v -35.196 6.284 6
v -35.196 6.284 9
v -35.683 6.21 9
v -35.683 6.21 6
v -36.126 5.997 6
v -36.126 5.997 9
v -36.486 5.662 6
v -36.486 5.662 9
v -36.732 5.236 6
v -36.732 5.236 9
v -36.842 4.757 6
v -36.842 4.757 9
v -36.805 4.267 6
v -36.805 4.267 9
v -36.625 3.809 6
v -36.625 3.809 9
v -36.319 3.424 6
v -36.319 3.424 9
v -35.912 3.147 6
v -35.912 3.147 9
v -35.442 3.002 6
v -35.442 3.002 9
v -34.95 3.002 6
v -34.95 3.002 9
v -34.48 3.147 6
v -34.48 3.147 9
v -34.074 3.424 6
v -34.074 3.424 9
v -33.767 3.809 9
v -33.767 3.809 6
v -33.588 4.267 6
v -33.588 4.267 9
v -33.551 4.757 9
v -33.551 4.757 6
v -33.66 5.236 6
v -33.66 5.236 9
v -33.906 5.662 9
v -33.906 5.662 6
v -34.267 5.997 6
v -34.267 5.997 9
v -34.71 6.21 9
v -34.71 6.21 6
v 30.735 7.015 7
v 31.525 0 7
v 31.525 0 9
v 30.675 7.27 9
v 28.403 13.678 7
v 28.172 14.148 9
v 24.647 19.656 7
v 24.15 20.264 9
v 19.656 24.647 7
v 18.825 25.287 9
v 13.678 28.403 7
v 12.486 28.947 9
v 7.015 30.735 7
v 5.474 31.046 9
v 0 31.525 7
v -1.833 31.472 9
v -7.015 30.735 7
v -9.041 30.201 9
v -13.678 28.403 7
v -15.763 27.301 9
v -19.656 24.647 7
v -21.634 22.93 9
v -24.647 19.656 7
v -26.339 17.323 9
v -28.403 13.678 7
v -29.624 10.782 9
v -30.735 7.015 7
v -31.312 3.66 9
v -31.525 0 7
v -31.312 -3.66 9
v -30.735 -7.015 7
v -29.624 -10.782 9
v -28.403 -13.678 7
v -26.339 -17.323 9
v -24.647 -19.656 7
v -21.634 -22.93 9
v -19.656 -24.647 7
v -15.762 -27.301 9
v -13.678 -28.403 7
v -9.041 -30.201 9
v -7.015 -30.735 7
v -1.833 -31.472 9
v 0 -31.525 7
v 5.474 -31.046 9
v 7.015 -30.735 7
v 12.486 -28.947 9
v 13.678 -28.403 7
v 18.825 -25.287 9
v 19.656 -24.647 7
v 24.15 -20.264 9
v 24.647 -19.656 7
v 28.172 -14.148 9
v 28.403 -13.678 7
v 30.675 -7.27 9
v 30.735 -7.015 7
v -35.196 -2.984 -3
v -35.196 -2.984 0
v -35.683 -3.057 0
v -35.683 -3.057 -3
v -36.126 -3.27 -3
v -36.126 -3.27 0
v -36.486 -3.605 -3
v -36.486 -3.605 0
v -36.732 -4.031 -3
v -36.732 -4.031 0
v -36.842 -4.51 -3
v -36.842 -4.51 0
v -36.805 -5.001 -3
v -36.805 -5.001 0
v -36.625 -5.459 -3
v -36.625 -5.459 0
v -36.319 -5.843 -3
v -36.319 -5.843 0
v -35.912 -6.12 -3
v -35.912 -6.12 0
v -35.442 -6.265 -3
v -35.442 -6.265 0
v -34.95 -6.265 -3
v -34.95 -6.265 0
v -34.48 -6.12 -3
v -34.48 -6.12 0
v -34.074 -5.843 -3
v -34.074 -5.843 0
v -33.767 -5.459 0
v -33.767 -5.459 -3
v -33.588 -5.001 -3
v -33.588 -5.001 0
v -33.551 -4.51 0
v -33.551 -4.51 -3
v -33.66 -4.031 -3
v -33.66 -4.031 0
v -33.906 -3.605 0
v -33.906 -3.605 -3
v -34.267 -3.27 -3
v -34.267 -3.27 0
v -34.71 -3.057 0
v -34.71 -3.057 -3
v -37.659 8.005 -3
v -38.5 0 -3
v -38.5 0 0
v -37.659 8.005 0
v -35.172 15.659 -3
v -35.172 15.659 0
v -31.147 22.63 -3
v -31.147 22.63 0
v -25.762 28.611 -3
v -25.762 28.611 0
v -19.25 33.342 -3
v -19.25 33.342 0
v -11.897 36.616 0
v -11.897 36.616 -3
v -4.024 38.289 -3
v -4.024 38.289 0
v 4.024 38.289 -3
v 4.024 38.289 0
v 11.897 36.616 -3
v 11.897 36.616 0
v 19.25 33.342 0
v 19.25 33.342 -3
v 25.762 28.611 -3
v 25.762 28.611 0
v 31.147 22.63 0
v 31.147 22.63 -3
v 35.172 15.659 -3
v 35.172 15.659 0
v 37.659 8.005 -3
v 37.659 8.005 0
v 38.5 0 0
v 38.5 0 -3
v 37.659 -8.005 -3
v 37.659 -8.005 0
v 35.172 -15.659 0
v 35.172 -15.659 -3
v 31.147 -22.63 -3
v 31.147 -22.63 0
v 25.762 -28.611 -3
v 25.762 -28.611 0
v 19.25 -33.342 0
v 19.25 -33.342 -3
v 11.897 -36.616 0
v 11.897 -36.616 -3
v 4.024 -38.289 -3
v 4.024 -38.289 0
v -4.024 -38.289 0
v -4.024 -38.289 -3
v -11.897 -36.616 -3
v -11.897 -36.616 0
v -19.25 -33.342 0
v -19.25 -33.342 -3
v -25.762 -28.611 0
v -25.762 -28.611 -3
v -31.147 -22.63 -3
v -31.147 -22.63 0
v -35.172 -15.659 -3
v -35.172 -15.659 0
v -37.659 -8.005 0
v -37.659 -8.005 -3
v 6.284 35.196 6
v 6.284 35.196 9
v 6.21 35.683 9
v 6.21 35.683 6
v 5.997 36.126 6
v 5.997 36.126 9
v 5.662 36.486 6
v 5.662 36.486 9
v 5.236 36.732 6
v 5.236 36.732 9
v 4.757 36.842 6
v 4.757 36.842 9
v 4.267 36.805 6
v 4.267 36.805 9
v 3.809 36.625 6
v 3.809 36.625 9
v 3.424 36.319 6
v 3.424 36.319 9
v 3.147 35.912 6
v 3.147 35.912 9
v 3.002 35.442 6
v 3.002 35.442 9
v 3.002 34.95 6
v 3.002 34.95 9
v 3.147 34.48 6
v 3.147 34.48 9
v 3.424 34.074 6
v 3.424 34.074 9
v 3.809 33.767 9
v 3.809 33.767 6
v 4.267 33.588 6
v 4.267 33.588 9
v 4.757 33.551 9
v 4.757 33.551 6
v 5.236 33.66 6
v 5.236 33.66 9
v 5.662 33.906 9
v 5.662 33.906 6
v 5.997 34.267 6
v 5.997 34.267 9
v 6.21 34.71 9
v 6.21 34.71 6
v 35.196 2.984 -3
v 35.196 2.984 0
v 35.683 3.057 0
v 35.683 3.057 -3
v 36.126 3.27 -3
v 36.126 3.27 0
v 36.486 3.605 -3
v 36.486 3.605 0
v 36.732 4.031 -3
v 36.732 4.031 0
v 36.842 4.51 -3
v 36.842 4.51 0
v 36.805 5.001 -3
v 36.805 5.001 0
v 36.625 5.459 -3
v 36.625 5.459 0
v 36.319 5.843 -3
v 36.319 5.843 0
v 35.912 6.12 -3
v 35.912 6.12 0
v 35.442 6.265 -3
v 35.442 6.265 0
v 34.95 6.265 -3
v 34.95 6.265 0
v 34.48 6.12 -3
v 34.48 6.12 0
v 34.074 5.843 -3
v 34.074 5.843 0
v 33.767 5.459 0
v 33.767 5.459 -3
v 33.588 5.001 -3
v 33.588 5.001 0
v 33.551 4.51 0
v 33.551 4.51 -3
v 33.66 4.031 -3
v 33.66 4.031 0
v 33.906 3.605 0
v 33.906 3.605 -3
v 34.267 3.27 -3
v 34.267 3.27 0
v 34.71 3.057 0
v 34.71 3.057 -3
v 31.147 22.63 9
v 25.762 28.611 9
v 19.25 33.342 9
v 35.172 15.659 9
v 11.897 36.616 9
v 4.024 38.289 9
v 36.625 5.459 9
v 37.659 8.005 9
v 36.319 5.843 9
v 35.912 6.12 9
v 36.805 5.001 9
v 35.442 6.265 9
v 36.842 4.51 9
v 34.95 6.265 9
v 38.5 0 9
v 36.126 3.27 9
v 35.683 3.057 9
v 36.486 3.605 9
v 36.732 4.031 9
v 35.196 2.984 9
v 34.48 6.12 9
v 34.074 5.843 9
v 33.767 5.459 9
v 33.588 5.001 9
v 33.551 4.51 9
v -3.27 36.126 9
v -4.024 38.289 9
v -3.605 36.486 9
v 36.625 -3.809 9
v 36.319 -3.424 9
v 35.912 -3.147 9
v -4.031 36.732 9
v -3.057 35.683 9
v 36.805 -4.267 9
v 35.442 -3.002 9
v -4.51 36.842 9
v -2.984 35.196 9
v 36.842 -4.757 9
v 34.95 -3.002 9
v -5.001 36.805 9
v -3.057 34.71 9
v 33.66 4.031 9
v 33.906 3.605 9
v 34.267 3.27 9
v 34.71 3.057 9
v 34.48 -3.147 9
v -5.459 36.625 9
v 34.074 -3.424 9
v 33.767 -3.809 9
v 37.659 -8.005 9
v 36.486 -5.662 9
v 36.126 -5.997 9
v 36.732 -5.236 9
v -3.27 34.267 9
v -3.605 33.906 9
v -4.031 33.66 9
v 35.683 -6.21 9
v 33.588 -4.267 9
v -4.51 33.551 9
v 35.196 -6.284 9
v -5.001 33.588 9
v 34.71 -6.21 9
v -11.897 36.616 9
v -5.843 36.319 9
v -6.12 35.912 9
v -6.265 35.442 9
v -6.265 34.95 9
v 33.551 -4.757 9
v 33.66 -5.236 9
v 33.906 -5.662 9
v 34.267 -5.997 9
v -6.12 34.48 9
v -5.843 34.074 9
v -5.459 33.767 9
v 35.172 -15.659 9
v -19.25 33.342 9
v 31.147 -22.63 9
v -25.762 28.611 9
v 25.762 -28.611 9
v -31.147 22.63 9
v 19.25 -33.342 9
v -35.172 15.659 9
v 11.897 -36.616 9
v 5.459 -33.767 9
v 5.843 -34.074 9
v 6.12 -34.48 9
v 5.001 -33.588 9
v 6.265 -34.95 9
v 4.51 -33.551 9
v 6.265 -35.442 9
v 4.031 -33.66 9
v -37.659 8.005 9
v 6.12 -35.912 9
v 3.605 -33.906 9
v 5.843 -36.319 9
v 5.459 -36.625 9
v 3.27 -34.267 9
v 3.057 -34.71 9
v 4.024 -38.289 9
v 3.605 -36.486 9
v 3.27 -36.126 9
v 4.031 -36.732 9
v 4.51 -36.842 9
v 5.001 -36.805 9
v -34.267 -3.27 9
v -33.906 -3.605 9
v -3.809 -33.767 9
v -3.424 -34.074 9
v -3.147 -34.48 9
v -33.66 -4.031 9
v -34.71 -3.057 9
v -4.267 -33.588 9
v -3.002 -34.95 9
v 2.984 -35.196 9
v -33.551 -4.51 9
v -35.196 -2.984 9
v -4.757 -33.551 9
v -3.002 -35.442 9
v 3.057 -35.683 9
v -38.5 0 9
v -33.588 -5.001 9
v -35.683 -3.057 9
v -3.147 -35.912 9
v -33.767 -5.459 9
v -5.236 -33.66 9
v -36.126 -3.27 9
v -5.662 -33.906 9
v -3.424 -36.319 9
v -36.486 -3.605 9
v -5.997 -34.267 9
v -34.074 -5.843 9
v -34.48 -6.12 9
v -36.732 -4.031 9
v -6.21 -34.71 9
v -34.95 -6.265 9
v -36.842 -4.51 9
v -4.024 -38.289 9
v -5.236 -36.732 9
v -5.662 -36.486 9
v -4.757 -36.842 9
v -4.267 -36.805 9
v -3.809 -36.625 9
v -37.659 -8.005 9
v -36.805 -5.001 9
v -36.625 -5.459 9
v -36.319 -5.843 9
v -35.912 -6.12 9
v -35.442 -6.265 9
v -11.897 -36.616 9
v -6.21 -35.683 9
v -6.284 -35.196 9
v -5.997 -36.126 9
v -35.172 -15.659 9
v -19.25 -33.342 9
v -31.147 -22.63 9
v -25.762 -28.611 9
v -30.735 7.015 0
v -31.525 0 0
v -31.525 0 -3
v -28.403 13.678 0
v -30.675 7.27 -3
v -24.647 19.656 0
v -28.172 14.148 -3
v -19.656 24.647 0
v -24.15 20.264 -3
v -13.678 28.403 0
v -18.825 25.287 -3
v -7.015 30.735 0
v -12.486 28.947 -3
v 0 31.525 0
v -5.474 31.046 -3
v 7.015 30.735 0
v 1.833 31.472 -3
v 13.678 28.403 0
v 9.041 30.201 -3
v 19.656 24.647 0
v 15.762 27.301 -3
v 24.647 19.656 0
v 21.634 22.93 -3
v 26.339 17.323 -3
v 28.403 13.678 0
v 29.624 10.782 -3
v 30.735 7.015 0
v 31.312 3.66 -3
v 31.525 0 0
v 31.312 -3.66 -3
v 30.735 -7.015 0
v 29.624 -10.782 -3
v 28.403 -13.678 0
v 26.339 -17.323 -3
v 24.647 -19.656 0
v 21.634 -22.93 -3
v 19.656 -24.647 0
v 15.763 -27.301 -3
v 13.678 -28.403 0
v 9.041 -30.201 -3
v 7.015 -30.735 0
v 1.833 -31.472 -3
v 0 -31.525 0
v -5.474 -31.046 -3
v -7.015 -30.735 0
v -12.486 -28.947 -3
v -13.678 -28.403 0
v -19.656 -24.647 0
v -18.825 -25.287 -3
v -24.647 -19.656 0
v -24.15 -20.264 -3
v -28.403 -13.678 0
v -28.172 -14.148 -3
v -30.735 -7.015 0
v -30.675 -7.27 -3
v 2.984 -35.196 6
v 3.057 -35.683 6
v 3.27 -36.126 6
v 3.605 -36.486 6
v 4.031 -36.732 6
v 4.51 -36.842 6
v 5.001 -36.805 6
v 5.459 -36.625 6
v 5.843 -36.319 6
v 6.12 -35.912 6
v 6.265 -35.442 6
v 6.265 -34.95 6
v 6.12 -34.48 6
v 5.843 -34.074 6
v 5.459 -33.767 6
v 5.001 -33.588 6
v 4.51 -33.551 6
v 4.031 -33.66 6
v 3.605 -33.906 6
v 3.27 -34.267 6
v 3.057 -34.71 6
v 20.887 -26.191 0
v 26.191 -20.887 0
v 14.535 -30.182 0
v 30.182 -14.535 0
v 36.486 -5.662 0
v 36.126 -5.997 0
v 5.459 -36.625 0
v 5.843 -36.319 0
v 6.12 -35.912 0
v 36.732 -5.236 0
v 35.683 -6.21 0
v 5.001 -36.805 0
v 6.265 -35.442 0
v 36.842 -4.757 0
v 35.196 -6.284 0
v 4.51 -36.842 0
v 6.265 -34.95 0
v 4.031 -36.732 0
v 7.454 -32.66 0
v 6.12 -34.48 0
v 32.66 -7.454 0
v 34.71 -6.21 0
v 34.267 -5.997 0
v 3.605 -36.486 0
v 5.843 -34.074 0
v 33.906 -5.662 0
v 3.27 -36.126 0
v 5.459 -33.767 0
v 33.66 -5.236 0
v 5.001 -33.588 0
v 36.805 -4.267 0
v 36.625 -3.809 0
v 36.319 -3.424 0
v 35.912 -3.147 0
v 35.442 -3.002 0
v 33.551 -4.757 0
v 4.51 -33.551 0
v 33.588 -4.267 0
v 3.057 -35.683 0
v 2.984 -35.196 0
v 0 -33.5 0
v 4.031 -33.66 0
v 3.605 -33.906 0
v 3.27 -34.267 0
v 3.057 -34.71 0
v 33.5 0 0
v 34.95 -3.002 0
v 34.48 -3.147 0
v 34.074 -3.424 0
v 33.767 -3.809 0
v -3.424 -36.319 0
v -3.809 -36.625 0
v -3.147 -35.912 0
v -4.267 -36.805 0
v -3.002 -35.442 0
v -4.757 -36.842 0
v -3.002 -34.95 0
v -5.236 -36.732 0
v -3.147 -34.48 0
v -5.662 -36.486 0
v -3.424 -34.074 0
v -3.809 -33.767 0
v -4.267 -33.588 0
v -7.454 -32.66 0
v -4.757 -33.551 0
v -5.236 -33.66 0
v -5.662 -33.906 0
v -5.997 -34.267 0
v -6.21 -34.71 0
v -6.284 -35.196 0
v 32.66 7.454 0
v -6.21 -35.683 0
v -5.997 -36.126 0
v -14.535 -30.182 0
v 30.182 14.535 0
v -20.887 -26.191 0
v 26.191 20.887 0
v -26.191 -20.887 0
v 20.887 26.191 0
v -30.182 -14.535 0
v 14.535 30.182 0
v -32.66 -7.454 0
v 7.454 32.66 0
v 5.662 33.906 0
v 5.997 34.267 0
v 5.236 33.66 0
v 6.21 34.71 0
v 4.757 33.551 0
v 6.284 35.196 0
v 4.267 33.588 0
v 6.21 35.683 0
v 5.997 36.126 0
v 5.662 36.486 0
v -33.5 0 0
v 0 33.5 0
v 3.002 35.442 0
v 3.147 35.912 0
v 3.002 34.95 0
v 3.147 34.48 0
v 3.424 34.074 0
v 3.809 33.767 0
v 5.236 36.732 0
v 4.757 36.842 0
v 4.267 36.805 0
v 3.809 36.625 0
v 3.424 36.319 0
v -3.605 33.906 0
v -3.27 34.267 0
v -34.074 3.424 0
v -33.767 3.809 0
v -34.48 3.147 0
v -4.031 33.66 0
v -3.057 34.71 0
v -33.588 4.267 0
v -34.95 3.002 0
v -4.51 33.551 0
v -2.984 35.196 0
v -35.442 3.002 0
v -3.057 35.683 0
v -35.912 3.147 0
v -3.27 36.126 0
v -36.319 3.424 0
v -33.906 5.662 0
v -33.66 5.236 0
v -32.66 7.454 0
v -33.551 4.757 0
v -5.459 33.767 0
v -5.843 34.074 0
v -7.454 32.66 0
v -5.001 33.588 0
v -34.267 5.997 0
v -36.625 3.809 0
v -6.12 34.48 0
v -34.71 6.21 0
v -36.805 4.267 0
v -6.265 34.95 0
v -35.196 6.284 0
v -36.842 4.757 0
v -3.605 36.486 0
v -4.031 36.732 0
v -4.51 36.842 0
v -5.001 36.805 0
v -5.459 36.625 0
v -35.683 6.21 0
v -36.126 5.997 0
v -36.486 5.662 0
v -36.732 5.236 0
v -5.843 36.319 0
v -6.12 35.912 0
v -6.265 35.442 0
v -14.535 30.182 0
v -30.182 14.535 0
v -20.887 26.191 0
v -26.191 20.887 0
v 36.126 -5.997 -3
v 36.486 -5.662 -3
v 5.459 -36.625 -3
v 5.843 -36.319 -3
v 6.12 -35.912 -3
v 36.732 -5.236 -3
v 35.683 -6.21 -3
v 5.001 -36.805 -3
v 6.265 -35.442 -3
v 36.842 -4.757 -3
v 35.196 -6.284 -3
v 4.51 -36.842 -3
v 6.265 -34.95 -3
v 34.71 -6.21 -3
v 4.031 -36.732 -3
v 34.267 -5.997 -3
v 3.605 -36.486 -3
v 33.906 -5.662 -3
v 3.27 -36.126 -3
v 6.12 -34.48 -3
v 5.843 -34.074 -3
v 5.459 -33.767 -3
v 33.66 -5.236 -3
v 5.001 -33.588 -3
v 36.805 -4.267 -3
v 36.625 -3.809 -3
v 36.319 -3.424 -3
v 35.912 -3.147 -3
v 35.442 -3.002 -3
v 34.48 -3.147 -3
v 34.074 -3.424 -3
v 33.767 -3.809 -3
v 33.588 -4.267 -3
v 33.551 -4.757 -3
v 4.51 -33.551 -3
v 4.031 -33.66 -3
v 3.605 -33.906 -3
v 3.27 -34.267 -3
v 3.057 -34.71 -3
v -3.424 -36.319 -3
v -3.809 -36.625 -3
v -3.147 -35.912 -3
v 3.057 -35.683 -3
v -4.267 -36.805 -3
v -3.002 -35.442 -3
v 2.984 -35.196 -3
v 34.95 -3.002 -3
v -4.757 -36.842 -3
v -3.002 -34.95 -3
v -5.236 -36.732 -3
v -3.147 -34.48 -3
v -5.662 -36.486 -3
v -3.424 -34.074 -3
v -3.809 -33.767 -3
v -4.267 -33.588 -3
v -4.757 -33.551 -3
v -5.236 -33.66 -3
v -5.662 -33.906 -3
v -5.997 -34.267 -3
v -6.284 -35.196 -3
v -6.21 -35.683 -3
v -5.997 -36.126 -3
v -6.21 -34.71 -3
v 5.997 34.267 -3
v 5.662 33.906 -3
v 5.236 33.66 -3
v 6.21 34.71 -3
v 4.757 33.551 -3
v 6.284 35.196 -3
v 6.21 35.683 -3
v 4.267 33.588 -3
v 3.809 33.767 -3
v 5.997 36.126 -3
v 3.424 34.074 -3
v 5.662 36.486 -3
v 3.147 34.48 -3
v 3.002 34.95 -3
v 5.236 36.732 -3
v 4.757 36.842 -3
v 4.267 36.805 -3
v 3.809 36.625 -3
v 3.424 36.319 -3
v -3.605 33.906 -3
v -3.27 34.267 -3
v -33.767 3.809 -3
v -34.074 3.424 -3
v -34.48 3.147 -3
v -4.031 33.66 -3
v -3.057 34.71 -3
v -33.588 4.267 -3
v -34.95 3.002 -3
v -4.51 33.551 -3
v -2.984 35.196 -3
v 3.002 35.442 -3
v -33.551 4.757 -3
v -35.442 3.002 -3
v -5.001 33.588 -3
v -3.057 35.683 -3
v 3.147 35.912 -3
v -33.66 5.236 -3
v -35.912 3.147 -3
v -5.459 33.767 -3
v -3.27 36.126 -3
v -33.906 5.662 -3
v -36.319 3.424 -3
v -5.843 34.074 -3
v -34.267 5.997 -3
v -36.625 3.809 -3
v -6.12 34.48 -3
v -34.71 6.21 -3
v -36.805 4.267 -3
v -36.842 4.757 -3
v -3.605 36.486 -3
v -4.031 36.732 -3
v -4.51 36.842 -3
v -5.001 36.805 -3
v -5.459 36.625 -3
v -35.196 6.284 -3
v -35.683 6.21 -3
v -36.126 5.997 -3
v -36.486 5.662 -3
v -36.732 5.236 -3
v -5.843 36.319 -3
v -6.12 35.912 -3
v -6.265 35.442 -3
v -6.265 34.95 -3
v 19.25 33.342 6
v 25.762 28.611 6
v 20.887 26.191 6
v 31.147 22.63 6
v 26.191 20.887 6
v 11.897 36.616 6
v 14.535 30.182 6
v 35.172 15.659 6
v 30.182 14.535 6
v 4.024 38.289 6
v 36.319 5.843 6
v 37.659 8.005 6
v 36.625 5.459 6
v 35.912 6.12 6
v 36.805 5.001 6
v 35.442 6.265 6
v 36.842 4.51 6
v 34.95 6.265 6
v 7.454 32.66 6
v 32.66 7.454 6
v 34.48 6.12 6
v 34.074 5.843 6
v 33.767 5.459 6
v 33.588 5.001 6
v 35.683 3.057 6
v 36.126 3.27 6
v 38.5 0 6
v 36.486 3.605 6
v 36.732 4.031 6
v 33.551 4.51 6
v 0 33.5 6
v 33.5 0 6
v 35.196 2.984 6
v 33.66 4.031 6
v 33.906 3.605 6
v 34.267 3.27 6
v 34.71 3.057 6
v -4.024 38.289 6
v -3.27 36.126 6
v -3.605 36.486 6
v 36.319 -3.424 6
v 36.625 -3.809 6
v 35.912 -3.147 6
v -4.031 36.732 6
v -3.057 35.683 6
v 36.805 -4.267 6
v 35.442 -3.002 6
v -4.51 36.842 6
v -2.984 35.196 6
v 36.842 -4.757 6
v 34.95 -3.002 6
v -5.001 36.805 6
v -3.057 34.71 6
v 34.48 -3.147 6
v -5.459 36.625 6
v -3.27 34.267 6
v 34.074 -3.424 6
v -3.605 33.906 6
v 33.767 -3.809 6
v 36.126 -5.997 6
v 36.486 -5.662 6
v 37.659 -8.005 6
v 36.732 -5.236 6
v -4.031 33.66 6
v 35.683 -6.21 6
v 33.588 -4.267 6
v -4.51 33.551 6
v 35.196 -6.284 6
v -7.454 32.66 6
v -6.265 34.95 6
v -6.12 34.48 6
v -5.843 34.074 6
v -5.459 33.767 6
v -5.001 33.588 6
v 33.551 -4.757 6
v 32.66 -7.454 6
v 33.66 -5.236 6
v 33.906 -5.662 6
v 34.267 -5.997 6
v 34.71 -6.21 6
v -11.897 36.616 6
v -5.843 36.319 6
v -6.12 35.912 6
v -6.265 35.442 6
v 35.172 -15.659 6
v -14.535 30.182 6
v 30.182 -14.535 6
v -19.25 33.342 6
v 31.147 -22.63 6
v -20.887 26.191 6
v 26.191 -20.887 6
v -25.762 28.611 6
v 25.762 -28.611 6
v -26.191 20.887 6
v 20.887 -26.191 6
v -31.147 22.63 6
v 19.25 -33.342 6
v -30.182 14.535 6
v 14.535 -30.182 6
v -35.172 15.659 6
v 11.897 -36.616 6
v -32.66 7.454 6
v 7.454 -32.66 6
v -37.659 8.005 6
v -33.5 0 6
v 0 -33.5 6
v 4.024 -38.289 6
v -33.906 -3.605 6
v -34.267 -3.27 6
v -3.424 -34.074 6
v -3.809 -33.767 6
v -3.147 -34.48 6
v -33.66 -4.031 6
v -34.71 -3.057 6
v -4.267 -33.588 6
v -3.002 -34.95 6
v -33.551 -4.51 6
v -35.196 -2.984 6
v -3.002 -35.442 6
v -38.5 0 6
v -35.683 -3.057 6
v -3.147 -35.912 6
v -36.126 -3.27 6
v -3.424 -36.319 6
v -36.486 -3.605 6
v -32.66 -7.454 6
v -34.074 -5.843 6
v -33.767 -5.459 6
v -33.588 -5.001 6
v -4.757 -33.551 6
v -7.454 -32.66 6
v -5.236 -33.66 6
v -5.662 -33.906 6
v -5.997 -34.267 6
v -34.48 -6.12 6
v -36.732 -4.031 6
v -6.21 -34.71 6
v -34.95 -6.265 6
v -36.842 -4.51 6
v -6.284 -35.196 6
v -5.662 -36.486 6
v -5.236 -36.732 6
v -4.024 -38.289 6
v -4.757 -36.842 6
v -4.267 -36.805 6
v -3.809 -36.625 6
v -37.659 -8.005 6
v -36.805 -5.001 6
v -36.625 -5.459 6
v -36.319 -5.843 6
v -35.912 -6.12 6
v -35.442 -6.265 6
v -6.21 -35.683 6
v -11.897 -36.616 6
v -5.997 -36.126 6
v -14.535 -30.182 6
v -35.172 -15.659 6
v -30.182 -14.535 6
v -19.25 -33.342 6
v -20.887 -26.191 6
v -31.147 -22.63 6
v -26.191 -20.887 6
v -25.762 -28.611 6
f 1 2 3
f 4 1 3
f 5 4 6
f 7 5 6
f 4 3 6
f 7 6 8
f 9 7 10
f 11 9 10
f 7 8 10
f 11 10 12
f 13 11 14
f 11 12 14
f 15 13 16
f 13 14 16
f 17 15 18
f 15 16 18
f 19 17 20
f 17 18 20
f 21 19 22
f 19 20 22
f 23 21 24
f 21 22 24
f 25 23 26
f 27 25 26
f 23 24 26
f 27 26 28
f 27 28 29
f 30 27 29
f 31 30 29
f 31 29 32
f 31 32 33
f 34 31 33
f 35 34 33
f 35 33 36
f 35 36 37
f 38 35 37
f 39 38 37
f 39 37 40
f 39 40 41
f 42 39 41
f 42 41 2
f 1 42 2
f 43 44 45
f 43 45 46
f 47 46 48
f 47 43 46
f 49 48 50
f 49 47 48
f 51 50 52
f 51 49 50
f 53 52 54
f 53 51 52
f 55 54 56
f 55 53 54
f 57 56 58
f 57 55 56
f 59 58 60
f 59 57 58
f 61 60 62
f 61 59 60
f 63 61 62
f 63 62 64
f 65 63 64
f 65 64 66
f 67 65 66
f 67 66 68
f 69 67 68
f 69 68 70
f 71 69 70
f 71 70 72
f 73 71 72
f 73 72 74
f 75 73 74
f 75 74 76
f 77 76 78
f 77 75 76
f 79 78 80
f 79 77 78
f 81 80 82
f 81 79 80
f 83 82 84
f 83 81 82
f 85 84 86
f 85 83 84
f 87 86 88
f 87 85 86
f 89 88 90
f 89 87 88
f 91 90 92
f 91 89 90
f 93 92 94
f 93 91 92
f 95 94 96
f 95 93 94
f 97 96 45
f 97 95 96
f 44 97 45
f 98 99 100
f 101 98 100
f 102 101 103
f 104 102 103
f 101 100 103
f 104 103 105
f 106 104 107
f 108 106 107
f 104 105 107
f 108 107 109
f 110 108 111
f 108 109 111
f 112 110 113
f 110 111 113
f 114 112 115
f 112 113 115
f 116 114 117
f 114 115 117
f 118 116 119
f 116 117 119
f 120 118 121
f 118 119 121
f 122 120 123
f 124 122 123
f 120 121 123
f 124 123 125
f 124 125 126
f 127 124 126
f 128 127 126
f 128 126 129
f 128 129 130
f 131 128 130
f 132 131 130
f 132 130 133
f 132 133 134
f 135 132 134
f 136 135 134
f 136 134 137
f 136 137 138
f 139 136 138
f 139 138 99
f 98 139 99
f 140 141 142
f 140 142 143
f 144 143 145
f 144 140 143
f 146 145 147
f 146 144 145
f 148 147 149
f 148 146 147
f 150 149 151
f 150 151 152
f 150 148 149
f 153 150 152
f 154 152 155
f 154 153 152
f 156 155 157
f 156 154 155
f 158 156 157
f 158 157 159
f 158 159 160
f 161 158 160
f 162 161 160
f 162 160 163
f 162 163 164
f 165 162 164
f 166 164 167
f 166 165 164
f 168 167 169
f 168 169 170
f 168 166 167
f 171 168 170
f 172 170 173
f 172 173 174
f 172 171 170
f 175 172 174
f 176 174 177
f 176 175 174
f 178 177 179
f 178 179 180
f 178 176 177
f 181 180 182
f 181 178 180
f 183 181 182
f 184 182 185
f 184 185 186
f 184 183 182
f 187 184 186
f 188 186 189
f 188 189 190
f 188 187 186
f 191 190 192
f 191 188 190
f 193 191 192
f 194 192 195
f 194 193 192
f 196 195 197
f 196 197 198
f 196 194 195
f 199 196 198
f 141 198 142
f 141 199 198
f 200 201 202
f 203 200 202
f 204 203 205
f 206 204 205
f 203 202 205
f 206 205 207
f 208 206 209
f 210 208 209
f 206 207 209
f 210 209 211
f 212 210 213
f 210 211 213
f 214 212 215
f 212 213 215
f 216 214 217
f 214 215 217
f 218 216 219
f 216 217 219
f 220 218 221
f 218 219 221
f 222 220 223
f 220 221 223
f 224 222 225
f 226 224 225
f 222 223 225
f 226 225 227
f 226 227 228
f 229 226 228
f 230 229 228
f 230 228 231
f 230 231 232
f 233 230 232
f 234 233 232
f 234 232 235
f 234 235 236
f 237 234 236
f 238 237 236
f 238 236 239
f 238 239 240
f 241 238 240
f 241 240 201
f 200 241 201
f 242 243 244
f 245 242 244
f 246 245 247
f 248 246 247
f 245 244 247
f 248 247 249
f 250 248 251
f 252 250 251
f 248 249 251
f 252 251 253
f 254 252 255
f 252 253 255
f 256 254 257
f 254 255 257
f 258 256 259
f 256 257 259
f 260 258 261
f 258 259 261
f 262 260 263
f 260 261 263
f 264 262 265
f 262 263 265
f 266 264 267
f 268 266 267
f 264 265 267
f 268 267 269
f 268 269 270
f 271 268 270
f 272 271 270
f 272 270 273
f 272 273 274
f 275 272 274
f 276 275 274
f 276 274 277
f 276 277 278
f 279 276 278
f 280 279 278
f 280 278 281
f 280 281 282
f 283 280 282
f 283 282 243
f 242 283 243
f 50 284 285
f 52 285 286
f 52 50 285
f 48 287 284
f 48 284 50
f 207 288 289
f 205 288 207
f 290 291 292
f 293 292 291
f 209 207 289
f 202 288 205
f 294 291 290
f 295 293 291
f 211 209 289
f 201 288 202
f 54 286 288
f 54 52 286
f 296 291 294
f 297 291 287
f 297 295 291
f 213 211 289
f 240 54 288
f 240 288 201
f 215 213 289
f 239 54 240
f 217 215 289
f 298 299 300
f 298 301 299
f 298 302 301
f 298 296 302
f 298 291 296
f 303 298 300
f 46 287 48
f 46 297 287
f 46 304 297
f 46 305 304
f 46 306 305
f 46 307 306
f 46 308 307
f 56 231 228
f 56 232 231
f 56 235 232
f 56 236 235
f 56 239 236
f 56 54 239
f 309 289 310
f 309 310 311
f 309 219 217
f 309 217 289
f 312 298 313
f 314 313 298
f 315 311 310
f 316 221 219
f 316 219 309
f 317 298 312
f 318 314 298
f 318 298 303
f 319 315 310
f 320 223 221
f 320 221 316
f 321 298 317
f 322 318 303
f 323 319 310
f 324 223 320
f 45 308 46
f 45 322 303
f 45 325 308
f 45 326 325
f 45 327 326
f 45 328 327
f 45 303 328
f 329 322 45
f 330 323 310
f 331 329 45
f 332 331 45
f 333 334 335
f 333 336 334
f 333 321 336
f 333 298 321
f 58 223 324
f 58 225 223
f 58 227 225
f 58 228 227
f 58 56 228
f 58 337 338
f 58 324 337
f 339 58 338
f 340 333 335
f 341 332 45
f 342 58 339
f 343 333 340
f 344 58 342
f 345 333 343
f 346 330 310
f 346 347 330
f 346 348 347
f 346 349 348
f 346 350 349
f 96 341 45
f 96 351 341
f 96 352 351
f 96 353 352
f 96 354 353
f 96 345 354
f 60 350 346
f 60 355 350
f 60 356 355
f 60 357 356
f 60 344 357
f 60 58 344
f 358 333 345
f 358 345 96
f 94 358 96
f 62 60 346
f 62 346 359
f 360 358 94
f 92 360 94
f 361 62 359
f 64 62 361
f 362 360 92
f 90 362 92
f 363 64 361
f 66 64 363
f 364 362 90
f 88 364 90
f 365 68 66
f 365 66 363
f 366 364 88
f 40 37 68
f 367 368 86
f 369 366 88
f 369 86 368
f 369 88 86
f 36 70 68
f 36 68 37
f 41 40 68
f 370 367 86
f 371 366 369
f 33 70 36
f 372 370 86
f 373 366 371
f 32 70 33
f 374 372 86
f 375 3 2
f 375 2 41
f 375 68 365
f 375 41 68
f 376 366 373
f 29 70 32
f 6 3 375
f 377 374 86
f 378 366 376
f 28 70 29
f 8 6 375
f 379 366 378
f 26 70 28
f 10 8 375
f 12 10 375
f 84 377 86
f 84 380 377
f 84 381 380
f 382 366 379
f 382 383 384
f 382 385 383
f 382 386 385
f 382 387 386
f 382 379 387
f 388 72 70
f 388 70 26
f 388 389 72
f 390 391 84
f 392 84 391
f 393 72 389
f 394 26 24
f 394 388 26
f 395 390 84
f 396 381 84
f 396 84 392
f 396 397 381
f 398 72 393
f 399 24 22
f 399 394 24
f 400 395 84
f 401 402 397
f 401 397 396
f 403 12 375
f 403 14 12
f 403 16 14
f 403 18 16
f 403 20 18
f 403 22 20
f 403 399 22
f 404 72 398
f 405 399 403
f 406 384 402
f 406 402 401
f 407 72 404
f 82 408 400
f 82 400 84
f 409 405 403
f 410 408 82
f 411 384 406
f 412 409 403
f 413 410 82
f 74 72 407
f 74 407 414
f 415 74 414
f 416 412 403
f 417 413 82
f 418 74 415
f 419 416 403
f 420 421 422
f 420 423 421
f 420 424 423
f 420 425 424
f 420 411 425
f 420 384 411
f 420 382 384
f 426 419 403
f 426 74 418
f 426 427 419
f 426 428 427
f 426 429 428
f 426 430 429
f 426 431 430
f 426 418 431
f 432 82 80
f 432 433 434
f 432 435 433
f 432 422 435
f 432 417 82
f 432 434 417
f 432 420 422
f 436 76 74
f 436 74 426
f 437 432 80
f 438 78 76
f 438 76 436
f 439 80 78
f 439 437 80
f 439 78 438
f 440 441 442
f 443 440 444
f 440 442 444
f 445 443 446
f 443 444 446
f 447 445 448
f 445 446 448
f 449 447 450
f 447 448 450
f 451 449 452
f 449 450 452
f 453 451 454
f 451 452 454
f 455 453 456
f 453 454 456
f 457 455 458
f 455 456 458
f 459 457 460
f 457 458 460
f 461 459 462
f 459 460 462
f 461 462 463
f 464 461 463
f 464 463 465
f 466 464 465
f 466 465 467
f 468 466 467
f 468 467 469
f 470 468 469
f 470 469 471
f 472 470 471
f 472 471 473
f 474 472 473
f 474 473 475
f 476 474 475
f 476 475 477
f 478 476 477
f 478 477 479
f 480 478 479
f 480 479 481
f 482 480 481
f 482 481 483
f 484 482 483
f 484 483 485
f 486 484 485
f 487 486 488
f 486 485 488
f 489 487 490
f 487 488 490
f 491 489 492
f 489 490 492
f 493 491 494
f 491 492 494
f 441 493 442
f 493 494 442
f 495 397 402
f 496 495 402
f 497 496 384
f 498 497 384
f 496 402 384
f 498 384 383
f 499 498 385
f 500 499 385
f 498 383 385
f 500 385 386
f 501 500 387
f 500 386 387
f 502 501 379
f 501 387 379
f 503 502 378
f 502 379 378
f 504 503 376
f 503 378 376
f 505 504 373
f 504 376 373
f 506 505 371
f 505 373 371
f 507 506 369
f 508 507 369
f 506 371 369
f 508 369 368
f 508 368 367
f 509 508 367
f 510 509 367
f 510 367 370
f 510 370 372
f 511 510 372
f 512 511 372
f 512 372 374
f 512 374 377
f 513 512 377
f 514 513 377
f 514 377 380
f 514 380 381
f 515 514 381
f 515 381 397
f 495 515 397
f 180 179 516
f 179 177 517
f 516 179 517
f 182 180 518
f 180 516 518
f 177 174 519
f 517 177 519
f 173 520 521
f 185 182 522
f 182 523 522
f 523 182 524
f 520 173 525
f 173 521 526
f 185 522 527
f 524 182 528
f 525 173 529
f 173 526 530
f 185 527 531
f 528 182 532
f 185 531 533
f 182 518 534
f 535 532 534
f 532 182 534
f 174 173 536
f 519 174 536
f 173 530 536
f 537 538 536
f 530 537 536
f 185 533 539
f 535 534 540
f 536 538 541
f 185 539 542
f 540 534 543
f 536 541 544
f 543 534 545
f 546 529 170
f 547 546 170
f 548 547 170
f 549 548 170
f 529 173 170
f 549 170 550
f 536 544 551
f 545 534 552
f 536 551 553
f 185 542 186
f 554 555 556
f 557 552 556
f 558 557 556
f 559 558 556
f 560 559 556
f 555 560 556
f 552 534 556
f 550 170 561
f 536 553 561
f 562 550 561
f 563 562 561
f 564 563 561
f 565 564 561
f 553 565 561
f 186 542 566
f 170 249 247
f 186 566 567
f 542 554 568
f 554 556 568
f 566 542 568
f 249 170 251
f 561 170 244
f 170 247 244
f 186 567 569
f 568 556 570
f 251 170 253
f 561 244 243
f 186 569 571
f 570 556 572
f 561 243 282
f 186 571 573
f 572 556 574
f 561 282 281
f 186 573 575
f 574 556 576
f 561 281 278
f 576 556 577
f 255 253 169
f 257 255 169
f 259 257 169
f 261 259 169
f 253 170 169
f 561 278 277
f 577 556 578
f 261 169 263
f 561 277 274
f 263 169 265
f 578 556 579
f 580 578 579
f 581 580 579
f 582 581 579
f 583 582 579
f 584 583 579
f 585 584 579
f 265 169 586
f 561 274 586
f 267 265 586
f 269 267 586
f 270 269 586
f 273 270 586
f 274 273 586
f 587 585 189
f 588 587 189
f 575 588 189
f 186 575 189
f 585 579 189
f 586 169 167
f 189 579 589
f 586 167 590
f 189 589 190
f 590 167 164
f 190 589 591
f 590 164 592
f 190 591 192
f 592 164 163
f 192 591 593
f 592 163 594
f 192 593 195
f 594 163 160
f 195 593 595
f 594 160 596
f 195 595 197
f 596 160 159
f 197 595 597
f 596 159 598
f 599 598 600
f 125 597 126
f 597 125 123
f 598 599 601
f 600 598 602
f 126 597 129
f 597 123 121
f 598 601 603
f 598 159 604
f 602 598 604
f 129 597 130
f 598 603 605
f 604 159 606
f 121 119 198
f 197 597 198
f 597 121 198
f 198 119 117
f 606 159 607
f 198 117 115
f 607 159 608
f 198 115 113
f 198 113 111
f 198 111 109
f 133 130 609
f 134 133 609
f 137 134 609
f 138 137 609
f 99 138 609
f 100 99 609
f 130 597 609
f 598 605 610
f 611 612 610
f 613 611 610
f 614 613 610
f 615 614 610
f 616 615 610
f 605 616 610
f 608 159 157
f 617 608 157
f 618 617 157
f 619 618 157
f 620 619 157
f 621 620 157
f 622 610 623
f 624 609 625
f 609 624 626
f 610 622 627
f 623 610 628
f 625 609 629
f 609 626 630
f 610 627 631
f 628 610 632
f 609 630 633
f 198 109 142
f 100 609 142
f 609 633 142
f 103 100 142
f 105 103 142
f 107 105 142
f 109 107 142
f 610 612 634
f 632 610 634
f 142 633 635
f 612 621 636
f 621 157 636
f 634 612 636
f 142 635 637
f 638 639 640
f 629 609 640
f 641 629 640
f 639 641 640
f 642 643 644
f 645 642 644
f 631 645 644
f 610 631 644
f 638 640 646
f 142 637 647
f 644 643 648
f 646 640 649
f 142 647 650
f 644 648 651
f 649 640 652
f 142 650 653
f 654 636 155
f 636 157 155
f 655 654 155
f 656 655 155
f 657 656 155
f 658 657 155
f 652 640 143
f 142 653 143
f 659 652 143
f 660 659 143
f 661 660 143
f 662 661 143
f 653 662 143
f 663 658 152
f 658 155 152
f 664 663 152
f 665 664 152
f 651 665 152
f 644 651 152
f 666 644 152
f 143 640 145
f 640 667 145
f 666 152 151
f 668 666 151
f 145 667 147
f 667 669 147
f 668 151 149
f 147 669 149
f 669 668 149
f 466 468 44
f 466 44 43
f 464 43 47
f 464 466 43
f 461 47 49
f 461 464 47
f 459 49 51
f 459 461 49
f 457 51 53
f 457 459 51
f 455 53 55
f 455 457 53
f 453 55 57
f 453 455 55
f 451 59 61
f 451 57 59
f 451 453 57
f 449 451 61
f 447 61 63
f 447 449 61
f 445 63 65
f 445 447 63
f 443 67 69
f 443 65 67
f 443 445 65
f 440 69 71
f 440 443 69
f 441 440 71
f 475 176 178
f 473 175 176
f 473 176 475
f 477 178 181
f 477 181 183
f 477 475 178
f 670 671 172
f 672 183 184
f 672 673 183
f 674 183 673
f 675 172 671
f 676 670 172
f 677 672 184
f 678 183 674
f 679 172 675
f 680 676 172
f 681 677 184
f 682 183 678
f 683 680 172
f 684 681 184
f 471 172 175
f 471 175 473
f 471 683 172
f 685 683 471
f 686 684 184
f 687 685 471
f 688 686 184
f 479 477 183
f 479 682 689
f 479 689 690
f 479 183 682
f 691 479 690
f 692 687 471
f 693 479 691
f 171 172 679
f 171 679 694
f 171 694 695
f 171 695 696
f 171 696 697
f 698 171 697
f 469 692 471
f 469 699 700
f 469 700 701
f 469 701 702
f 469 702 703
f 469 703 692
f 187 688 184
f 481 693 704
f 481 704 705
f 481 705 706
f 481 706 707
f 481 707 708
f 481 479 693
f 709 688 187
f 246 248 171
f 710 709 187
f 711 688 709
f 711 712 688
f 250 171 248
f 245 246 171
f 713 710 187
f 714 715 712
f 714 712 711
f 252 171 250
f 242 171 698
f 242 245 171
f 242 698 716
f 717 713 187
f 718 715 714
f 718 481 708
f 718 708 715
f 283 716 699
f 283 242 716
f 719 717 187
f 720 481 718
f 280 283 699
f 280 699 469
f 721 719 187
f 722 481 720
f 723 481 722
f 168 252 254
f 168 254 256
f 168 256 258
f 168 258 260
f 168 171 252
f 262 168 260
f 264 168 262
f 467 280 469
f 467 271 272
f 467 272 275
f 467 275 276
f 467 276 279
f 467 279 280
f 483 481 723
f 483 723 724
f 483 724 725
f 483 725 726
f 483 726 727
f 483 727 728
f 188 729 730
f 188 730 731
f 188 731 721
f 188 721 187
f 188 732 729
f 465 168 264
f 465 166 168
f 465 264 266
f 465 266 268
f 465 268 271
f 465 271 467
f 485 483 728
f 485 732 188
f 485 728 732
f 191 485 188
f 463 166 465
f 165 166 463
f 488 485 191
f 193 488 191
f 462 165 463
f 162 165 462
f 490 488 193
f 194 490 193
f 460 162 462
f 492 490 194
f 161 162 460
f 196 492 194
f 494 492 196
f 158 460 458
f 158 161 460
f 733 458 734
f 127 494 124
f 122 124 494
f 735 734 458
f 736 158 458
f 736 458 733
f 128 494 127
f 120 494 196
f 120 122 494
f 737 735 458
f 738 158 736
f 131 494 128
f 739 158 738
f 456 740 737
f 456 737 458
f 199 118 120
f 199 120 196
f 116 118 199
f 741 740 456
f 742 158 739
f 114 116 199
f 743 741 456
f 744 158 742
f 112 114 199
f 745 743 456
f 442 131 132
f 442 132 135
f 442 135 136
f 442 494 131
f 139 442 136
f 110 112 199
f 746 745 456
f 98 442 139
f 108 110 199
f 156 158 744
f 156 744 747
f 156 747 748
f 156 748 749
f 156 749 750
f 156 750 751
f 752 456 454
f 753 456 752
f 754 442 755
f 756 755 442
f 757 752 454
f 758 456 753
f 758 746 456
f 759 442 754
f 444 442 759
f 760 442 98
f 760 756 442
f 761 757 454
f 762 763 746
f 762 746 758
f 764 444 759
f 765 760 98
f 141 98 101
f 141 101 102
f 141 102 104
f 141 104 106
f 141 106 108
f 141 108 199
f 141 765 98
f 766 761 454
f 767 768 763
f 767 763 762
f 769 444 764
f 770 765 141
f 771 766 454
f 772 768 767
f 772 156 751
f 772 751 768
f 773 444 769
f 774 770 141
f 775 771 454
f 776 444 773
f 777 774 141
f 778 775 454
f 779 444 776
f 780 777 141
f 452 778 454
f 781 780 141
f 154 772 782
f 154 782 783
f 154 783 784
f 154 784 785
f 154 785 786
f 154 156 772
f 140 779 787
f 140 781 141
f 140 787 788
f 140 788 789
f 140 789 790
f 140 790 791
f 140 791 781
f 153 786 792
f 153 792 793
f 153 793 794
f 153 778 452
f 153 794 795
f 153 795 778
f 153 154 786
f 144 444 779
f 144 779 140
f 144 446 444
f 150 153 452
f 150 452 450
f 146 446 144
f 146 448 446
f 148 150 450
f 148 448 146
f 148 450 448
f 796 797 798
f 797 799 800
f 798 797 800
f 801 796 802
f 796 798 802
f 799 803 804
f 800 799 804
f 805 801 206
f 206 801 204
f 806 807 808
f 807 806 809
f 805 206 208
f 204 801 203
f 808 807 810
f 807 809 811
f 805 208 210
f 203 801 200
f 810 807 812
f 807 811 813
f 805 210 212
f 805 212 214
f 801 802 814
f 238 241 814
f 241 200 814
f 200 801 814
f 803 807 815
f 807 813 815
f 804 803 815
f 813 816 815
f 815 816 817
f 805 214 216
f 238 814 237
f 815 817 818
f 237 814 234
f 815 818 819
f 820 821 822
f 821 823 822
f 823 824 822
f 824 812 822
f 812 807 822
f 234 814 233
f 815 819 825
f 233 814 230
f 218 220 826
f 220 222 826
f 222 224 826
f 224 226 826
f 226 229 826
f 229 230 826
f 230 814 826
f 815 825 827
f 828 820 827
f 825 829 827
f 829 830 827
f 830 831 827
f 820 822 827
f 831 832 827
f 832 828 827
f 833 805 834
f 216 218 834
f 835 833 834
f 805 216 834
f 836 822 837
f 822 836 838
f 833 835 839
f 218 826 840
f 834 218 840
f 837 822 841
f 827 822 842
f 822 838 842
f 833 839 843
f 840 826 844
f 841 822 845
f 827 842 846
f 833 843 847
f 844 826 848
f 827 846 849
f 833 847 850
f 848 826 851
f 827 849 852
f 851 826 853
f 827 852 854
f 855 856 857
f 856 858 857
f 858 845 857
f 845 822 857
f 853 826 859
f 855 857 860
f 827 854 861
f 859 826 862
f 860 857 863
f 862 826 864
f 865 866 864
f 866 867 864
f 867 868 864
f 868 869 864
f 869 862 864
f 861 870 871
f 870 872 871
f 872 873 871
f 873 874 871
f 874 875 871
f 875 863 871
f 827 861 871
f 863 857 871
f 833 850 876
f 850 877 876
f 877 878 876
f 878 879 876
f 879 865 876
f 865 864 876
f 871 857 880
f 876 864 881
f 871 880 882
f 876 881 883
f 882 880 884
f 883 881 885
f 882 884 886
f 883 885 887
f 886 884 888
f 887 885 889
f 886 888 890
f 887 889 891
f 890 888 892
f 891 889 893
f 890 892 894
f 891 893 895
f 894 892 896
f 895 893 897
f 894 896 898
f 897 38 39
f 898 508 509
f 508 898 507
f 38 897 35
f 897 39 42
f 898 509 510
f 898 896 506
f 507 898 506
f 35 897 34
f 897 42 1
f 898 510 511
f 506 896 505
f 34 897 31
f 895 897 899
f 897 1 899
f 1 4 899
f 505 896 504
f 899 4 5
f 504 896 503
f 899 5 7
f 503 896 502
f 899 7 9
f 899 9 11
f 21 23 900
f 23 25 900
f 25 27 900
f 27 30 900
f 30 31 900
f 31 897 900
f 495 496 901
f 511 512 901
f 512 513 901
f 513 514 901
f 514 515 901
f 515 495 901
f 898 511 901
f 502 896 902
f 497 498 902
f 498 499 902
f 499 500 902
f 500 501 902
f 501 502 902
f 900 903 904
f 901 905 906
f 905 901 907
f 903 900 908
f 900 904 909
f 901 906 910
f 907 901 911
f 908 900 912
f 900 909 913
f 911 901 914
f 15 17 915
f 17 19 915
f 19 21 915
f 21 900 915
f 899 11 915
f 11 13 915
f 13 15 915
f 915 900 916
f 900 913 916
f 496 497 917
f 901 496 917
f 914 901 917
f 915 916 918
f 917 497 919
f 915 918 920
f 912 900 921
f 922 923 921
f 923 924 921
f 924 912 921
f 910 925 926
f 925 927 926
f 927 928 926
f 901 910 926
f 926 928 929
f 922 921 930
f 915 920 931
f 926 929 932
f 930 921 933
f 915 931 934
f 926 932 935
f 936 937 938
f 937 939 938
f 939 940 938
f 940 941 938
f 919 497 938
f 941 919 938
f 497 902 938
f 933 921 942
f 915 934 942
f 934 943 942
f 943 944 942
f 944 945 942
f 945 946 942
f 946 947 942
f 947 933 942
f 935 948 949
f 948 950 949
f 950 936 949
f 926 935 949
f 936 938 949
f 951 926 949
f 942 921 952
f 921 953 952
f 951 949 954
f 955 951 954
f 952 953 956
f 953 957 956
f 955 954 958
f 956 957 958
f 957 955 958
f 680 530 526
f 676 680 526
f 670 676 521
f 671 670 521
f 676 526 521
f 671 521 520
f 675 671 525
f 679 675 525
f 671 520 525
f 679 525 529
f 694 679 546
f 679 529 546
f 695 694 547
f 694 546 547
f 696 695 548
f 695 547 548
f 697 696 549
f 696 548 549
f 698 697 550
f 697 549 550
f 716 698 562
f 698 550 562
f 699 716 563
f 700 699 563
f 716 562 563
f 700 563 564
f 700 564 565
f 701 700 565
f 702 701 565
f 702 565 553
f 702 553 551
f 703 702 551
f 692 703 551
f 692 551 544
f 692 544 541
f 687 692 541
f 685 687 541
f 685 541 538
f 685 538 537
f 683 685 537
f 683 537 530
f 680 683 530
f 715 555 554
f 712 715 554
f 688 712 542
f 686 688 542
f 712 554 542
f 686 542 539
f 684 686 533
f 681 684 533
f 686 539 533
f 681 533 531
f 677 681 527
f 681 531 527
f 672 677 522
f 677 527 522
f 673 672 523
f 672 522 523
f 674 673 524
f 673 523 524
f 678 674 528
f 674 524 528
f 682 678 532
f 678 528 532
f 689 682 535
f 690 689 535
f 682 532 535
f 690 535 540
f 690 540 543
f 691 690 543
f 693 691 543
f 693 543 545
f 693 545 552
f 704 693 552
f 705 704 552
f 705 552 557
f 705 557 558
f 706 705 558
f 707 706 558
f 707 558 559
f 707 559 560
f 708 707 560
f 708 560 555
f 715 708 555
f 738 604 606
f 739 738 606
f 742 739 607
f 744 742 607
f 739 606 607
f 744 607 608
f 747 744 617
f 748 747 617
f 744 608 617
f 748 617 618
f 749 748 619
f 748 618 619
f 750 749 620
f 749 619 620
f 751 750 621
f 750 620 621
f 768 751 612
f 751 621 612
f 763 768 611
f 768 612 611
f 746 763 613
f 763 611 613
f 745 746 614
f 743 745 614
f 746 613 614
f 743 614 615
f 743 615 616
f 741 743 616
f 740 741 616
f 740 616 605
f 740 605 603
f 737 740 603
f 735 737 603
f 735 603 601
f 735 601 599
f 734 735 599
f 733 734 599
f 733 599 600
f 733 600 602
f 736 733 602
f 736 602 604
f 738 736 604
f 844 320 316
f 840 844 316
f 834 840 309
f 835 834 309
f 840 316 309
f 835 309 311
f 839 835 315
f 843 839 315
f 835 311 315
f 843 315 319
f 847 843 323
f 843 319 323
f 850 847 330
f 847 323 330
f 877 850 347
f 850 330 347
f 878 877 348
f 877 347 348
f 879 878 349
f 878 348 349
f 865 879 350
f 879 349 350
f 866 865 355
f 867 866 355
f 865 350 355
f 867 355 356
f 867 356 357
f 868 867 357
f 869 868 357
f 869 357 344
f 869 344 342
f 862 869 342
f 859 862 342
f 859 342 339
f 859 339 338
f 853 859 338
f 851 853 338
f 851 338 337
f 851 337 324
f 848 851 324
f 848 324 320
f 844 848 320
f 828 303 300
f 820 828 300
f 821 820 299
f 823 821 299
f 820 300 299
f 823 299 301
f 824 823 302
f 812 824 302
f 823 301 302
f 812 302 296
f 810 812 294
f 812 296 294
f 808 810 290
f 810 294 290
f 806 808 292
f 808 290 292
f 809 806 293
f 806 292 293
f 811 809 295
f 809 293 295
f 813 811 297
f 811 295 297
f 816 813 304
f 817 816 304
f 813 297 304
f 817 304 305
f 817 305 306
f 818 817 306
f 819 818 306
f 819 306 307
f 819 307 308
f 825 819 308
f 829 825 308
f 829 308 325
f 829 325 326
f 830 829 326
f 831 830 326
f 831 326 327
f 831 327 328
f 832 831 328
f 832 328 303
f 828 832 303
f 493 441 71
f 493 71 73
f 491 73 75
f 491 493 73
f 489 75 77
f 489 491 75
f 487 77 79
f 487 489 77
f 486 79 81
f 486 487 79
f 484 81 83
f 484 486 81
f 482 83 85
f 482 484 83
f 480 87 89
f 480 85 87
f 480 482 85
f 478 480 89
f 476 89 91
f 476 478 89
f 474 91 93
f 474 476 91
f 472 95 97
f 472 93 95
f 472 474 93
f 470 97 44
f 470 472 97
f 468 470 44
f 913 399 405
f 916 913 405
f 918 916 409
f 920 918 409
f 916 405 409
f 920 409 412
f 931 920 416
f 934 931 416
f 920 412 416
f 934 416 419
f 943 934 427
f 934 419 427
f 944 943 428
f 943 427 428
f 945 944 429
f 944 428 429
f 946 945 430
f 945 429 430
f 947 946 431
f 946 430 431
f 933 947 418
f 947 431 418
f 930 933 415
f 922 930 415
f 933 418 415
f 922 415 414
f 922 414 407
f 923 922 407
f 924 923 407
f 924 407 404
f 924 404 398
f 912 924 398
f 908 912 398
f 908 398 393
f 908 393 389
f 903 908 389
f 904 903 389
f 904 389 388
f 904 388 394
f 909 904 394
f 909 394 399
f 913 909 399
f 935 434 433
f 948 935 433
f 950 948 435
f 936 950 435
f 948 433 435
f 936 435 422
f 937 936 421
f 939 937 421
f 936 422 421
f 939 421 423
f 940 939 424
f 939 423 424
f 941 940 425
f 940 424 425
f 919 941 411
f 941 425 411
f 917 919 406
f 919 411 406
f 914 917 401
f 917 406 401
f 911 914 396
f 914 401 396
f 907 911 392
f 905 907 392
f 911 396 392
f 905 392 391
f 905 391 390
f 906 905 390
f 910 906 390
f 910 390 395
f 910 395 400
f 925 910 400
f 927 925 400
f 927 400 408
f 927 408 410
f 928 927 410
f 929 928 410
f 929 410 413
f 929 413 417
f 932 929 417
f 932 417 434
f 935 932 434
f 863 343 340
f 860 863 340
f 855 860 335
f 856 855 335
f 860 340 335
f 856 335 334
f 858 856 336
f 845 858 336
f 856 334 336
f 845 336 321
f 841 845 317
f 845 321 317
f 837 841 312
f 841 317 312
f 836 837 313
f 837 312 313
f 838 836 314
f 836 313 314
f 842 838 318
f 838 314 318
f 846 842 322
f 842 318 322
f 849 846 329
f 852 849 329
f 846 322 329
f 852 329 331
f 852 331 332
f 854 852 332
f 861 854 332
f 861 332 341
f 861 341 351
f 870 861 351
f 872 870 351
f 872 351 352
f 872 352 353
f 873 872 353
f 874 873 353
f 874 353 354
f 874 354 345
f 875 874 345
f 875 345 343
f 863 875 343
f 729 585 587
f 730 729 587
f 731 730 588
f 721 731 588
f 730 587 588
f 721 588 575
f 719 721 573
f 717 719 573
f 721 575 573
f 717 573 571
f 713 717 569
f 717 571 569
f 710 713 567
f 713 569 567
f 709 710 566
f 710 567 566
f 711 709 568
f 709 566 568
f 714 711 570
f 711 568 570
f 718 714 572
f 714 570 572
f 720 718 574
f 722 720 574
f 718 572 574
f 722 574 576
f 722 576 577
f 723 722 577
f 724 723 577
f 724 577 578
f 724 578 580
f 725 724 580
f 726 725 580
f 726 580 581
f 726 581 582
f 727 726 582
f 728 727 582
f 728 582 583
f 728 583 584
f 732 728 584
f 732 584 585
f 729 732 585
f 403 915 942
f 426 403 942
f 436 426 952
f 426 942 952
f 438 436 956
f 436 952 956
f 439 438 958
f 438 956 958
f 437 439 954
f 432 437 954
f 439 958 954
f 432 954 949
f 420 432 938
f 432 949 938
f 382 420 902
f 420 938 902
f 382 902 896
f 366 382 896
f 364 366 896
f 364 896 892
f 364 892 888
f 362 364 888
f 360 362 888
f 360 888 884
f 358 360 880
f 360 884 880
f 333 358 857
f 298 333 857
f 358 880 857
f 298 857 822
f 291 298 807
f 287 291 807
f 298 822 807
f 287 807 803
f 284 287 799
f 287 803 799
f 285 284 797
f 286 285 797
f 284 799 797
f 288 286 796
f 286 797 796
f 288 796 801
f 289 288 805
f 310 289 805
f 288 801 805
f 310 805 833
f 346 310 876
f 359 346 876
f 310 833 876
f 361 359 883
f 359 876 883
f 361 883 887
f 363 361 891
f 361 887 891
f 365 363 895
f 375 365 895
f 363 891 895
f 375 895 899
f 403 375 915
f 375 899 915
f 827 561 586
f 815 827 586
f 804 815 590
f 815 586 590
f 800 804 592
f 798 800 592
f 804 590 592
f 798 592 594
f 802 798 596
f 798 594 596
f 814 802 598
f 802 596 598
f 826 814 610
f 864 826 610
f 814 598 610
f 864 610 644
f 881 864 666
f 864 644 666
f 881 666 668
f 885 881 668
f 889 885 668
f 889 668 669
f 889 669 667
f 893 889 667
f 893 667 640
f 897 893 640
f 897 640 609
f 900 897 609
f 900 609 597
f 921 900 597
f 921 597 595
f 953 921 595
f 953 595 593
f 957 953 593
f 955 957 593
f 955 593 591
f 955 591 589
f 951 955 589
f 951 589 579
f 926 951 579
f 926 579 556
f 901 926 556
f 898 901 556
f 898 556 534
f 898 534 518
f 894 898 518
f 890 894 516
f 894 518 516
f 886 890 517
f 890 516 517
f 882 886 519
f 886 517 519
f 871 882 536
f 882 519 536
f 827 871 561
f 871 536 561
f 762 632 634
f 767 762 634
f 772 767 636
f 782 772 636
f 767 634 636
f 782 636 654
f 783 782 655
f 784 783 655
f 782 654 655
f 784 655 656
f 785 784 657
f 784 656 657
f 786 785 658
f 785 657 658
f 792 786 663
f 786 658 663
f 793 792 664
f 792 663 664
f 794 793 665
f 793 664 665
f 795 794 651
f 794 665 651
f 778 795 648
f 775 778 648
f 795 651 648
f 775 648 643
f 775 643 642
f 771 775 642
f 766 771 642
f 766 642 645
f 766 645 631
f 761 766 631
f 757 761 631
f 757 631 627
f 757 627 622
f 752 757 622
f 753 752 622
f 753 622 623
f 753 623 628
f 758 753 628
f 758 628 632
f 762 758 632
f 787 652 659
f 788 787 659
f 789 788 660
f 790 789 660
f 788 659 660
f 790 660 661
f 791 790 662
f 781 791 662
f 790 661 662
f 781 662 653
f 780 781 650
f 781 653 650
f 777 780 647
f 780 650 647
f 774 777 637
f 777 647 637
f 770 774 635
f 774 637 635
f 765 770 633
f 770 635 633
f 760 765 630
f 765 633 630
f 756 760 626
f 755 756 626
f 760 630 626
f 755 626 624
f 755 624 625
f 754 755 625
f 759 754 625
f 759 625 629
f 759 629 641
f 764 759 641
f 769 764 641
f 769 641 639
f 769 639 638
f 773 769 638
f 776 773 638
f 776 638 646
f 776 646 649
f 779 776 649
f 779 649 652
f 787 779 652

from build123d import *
from build123d.topology import SkipClean

# Parameters (mm, degrees)
SKETCH1_R           = 33.5
SKETCH1_R_2         = 31.5
BOSS_EXTRUDE1_DEPTH = 9
BOSS_EXTRUDE2_START = -3
SKETCH1_2_R         = 33.5
BOSS_EXTRUDE2_DEPTH = 3
SKETCH2_R           = 38.5
SKETCH2_R_2         = 33.5
BOSS_EXTRUDE3_DEPTH = 3
BOSS_EXTRUDE4_START = -3
SKETCH3_R           = 38.5
SKETCH3_R_2         = 33.5
BOSS_EXTRUDE4_DEPTH = 3
SKETCH10_R          = 2
CUT_EXTRUDE1_DEPTH  = 10
M4_TAPPED_HOLE1_D   = 3.3
CIRPATTERN1_COUNT   = 4
SKETCH14_R          = 31.525
CUT_EXTRUDE2_DEPTH  = 56.186048962
SKETCH15_R          = 31.525
CUT_EXTRUDE3_DEPTH  = 10


with BuildPart() as part:
    # Sketch1 → Boss-Extrude1 (new body)
    with BuildSketch(Plane.XY):
        Circle(SKETCH1_R)
        Circle(SKETCH1_R_2, mode=Mode.SUBTRACT)
    extrude(amount=BOSS_EXTRUDE1_DEPTH)

    # Sketch1<2> → Boss-Extrude2 (add)
    with BuildSketch(Plane.XY.offset(BOSS_EXTRUDE2_START)):
        Circle(SKETCH1_2_R)
    extrude(amount=BOSS_EXTRUDE2_DEPTH)

    # Sketch2 → Boss-Extrude3 (add)
    with BuildSketch(Plane(origin=(0, 0, -3), x_dir=(-1, 0, 0), z_dir=(0, 0, -1))):
        Circle(SKETCH2_R)
        Circle(SKETCH2_R_2, mode=Mode.SUBTRACT)
    extrude(amount=-BOSS_EXTRUDE3_DEPTH)

    # Sketch3 → Boss-Extrude4 (add)
    with BuildSketch(Plane.XY.offset(9).offset(BOSS_EXTRUDE4_START)):
        Circle(SKETCH3_R)
        Circle(SKETCH3_R_2, mode=Mode.SUBTRACT)
    extrude(amount=BOSS_EXTRUDE4_DEPTH)

    # Sketch10 → Cut-Extrude1 (cut)
    with BuildSketch(Plane(origin=(0, 0, -3), x_dir=(-1, 0, 0), z_dir=(0, 0, -1))):
        with Locations((0, 11)):
            Circle(SKETCH10_R)
        with Locations((11, 0)):
            Circle(SKETCH10_R)
        with Locations((0, -11)):
            Circle(SKETCH10_R)
        with Locations((-11, 0)):
            Circle(SKETCH10_R)
    extrude(amount=-CUT_EXTRUDE1_DEPTH, mode=Mode.SUBTRACT)

    # M4 Tapped Hole1 (through all)
    with Locations(Plane(origin=(0, 0, -3), x_dir=(-1, 0, 0), z_dir=(0, 0, -1))):
        with Locations((-4.633679824, 35.196292579), (4.633679824, 35.196292579)):
            m4_tapped_hole1 = Hole(M4_TAPPED_HOLE1_D / 2)

    # CirPattern1: M4 Tapped Hole1 ×4 about axis
    cirpattern1_axis = Axis((0, 0, 9), (0, 0, -1))
    for i in range(1, CIRPATTERN1_COUNT):
        add(m4_tapped_hole1.rotate(cirpattern1_axis, i * 360 / CIRPATTERN1_COUNT), mode=Mode.SUBTRACT)

    # Sketch14 → Cut-Extrude2 (cut, through all)
    with BuildSketch(Plane.XY):
        Circle(SKETCH14_R)
    extrude(amount=CUT_EXTRUDE2_DEPTH, mode=Mode.SUBTRACT)

    # Sketch15 → Cut-Extrude3 (cut)
    with SkipClean():  # the faces are left unmerged after this step: merging them gives an invalid solid
        with BuildSketch(Plane(origin=(0, 0, -3), x_dir=(-1, 0, 0), z_dir=(0, 0, -1))):
            Circle(SKETCH15_R)
        extrude(amount=-CUT_EXTRUDE3_DEPTH, mode=Mode.SUBTRACT)


solid = part.part
